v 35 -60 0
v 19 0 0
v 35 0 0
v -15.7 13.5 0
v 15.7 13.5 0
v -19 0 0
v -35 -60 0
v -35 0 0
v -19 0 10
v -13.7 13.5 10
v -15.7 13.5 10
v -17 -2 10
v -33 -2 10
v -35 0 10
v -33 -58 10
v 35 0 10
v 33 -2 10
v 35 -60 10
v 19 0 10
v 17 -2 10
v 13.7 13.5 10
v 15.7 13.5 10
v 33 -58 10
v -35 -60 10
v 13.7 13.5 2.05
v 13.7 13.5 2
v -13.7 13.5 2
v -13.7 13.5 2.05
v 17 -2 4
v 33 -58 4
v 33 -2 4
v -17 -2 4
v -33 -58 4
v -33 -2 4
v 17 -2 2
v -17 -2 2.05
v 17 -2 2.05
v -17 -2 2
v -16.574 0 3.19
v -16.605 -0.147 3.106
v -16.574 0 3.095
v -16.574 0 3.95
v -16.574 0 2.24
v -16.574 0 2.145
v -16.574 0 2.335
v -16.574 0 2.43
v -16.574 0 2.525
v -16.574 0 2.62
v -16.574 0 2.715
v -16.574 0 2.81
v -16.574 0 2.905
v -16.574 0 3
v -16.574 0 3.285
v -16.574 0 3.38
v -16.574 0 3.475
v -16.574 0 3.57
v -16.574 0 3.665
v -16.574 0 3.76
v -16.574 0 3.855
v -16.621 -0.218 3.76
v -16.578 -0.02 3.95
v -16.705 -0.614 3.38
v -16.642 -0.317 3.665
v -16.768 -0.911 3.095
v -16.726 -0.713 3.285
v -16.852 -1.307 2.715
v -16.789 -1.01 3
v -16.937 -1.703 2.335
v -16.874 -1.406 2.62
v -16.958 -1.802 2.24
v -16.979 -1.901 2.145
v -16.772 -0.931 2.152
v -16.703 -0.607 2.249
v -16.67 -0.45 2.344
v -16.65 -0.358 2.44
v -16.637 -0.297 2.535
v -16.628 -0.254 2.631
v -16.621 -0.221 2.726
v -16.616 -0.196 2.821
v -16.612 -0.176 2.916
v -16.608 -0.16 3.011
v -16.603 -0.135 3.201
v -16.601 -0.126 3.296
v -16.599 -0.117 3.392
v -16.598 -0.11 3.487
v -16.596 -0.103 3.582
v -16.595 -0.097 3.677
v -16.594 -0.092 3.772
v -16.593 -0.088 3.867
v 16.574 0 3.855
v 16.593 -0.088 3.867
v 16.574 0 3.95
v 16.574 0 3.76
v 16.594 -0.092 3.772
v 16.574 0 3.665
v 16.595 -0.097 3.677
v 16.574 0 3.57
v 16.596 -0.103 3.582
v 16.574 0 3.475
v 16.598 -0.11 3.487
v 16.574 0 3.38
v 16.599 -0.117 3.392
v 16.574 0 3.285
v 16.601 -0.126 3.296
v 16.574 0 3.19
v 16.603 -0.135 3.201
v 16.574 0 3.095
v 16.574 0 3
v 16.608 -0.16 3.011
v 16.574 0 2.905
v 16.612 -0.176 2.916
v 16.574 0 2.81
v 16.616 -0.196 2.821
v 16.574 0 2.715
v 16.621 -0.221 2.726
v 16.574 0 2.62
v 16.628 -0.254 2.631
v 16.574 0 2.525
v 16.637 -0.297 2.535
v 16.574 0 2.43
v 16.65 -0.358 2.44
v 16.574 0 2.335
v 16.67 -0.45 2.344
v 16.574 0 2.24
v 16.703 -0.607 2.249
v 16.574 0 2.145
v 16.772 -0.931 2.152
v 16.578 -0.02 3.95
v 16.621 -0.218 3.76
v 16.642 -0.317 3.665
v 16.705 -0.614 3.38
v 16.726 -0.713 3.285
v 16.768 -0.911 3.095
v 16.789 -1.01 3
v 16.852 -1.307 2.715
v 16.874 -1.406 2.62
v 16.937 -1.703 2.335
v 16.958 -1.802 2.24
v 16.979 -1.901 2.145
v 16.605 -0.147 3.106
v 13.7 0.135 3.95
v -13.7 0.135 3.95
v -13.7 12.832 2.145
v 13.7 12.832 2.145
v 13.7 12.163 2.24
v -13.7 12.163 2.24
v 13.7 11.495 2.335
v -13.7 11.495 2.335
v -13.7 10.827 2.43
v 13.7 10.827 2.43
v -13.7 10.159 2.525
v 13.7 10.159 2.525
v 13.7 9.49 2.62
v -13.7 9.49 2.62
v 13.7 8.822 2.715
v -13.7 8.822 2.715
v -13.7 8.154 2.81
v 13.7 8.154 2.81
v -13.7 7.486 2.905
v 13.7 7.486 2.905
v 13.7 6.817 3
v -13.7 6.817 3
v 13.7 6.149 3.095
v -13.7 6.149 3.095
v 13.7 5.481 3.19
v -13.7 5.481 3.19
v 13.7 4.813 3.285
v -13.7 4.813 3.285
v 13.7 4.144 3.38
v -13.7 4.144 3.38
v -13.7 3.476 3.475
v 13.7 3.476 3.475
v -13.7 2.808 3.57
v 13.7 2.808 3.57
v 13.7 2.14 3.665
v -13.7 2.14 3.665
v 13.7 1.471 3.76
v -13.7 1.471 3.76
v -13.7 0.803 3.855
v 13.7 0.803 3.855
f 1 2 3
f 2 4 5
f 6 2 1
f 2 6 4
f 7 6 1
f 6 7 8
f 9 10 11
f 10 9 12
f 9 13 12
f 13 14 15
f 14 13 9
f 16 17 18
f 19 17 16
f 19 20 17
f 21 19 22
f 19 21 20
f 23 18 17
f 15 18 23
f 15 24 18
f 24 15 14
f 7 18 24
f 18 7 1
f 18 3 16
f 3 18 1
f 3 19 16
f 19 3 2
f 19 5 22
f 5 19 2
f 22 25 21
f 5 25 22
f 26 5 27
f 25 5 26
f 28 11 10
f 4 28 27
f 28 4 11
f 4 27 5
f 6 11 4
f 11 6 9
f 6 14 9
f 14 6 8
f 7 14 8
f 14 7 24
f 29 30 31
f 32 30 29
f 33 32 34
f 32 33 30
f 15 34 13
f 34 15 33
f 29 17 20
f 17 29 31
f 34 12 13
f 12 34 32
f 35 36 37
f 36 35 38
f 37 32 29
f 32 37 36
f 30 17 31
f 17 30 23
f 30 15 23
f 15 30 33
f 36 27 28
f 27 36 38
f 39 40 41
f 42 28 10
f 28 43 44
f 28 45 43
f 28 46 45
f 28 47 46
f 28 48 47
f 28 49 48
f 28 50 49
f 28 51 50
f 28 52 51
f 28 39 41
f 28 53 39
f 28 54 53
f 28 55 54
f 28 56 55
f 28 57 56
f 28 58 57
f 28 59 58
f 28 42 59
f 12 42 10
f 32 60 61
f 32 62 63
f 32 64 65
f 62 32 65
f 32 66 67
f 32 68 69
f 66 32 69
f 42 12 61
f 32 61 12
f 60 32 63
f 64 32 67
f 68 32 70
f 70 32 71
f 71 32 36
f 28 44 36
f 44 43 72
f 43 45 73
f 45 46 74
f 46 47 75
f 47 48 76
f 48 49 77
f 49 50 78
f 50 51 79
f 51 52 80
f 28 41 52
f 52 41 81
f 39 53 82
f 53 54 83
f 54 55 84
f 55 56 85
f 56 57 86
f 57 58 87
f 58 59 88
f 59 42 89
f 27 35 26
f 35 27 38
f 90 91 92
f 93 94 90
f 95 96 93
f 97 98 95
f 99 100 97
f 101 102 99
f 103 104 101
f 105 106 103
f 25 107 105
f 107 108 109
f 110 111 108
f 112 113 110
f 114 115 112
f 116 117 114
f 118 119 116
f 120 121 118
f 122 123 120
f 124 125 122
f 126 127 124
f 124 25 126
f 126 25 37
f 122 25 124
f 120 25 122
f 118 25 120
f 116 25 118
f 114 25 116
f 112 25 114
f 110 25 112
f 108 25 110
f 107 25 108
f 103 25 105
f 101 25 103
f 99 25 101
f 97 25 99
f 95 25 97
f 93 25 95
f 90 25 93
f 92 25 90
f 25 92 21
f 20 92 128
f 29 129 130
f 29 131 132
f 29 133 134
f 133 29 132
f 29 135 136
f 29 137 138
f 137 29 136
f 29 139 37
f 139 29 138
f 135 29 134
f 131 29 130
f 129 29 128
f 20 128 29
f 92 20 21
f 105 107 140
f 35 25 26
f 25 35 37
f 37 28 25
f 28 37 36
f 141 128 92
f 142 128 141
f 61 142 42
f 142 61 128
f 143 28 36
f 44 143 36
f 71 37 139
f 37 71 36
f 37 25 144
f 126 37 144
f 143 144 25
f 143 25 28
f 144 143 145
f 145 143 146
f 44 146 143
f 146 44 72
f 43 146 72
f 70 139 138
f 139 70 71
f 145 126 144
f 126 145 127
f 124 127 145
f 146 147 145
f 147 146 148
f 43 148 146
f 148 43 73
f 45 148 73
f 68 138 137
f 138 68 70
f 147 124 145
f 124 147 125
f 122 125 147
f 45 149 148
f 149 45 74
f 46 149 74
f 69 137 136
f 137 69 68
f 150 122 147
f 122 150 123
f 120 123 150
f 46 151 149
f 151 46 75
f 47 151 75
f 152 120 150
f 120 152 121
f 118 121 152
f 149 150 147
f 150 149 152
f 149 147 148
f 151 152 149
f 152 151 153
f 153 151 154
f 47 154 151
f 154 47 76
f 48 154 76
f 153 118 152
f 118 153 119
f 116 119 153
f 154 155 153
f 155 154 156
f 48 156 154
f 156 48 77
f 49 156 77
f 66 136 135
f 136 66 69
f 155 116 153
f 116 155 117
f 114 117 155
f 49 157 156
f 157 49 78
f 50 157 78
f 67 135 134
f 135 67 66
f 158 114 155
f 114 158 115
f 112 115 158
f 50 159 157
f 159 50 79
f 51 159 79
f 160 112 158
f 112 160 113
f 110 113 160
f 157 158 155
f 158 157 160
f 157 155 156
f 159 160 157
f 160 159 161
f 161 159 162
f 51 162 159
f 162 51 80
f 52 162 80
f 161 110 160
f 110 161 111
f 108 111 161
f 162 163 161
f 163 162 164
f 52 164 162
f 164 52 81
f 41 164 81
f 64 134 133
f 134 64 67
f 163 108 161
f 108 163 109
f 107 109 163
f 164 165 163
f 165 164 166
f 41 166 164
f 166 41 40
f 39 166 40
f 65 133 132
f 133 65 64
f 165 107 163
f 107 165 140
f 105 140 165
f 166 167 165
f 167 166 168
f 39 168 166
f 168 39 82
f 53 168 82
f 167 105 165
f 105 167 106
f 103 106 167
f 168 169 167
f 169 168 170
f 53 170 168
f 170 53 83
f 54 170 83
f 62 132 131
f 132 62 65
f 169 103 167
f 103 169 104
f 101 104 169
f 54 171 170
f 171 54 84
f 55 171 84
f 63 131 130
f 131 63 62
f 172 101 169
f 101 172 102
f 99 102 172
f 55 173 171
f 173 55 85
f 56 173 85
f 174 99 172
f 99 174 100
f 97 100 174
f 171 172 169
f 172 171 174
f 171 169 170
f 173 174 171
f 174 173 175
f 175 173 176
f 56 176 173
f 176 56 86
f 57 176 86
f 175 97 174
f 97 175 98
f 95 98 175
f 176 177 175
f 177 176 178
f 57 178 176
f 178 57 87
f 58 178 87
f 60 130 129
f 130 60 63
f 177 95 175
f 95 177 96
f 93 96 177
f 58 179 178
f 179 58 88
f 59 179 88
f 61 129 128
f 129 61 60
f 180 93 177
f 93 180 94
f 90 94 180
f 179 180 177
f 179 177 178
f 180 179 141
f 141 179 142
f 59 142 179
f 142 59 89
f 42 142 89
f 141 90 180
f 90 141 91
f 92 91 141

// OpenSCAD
/*
日本の硬貨
  1円 20.0mm 約1.5mm 1.0g
  5円 22.0mm 約1.5mm 3.75g
 10円 23.5mm 約1.5mm 4.5g
 50円 21.0mm 約1.7mm 4.0g
100円 22.6mm 約1.7mm 4.8g
500円 26.5mm 約1.8mm 7.0g
*/

// 雑に硬貨を放り込める投入口(ある程度束で突っ込めるやつ)
difference(){
    linear_extrude(10) union() {
        // 仮硬貨
        //translate([0,13.5,0]) circle(13.5,$fn=100);
        polygon([[-19,0],[-15.7,13.5],[15.7,13.5],[19,0]]);
        translate([-35,-60,0]) square([70,60]);
    }
    color("red")translate([0,0,4]) linear_extrude(6)  union(){
        //polygon([[-17,-2],[-13.7,13.5],[13.7,13.5],[17,-2]]);
        translate([-33,-58,0]) square([66,56]);
    }
    translate([0,0,2]) linear_extrude(8) polygon([[-17,-2],[-13.7,13.5],[13.7,13.5],[17,-2]]);
}
translate([0,0,3]) linear_extrude(1.9,scale=[1,0.01],center=true,slices=20) polygon([[-17,-2],[-13.7,13.5],[13.7,13.5],[17,-2]]);
